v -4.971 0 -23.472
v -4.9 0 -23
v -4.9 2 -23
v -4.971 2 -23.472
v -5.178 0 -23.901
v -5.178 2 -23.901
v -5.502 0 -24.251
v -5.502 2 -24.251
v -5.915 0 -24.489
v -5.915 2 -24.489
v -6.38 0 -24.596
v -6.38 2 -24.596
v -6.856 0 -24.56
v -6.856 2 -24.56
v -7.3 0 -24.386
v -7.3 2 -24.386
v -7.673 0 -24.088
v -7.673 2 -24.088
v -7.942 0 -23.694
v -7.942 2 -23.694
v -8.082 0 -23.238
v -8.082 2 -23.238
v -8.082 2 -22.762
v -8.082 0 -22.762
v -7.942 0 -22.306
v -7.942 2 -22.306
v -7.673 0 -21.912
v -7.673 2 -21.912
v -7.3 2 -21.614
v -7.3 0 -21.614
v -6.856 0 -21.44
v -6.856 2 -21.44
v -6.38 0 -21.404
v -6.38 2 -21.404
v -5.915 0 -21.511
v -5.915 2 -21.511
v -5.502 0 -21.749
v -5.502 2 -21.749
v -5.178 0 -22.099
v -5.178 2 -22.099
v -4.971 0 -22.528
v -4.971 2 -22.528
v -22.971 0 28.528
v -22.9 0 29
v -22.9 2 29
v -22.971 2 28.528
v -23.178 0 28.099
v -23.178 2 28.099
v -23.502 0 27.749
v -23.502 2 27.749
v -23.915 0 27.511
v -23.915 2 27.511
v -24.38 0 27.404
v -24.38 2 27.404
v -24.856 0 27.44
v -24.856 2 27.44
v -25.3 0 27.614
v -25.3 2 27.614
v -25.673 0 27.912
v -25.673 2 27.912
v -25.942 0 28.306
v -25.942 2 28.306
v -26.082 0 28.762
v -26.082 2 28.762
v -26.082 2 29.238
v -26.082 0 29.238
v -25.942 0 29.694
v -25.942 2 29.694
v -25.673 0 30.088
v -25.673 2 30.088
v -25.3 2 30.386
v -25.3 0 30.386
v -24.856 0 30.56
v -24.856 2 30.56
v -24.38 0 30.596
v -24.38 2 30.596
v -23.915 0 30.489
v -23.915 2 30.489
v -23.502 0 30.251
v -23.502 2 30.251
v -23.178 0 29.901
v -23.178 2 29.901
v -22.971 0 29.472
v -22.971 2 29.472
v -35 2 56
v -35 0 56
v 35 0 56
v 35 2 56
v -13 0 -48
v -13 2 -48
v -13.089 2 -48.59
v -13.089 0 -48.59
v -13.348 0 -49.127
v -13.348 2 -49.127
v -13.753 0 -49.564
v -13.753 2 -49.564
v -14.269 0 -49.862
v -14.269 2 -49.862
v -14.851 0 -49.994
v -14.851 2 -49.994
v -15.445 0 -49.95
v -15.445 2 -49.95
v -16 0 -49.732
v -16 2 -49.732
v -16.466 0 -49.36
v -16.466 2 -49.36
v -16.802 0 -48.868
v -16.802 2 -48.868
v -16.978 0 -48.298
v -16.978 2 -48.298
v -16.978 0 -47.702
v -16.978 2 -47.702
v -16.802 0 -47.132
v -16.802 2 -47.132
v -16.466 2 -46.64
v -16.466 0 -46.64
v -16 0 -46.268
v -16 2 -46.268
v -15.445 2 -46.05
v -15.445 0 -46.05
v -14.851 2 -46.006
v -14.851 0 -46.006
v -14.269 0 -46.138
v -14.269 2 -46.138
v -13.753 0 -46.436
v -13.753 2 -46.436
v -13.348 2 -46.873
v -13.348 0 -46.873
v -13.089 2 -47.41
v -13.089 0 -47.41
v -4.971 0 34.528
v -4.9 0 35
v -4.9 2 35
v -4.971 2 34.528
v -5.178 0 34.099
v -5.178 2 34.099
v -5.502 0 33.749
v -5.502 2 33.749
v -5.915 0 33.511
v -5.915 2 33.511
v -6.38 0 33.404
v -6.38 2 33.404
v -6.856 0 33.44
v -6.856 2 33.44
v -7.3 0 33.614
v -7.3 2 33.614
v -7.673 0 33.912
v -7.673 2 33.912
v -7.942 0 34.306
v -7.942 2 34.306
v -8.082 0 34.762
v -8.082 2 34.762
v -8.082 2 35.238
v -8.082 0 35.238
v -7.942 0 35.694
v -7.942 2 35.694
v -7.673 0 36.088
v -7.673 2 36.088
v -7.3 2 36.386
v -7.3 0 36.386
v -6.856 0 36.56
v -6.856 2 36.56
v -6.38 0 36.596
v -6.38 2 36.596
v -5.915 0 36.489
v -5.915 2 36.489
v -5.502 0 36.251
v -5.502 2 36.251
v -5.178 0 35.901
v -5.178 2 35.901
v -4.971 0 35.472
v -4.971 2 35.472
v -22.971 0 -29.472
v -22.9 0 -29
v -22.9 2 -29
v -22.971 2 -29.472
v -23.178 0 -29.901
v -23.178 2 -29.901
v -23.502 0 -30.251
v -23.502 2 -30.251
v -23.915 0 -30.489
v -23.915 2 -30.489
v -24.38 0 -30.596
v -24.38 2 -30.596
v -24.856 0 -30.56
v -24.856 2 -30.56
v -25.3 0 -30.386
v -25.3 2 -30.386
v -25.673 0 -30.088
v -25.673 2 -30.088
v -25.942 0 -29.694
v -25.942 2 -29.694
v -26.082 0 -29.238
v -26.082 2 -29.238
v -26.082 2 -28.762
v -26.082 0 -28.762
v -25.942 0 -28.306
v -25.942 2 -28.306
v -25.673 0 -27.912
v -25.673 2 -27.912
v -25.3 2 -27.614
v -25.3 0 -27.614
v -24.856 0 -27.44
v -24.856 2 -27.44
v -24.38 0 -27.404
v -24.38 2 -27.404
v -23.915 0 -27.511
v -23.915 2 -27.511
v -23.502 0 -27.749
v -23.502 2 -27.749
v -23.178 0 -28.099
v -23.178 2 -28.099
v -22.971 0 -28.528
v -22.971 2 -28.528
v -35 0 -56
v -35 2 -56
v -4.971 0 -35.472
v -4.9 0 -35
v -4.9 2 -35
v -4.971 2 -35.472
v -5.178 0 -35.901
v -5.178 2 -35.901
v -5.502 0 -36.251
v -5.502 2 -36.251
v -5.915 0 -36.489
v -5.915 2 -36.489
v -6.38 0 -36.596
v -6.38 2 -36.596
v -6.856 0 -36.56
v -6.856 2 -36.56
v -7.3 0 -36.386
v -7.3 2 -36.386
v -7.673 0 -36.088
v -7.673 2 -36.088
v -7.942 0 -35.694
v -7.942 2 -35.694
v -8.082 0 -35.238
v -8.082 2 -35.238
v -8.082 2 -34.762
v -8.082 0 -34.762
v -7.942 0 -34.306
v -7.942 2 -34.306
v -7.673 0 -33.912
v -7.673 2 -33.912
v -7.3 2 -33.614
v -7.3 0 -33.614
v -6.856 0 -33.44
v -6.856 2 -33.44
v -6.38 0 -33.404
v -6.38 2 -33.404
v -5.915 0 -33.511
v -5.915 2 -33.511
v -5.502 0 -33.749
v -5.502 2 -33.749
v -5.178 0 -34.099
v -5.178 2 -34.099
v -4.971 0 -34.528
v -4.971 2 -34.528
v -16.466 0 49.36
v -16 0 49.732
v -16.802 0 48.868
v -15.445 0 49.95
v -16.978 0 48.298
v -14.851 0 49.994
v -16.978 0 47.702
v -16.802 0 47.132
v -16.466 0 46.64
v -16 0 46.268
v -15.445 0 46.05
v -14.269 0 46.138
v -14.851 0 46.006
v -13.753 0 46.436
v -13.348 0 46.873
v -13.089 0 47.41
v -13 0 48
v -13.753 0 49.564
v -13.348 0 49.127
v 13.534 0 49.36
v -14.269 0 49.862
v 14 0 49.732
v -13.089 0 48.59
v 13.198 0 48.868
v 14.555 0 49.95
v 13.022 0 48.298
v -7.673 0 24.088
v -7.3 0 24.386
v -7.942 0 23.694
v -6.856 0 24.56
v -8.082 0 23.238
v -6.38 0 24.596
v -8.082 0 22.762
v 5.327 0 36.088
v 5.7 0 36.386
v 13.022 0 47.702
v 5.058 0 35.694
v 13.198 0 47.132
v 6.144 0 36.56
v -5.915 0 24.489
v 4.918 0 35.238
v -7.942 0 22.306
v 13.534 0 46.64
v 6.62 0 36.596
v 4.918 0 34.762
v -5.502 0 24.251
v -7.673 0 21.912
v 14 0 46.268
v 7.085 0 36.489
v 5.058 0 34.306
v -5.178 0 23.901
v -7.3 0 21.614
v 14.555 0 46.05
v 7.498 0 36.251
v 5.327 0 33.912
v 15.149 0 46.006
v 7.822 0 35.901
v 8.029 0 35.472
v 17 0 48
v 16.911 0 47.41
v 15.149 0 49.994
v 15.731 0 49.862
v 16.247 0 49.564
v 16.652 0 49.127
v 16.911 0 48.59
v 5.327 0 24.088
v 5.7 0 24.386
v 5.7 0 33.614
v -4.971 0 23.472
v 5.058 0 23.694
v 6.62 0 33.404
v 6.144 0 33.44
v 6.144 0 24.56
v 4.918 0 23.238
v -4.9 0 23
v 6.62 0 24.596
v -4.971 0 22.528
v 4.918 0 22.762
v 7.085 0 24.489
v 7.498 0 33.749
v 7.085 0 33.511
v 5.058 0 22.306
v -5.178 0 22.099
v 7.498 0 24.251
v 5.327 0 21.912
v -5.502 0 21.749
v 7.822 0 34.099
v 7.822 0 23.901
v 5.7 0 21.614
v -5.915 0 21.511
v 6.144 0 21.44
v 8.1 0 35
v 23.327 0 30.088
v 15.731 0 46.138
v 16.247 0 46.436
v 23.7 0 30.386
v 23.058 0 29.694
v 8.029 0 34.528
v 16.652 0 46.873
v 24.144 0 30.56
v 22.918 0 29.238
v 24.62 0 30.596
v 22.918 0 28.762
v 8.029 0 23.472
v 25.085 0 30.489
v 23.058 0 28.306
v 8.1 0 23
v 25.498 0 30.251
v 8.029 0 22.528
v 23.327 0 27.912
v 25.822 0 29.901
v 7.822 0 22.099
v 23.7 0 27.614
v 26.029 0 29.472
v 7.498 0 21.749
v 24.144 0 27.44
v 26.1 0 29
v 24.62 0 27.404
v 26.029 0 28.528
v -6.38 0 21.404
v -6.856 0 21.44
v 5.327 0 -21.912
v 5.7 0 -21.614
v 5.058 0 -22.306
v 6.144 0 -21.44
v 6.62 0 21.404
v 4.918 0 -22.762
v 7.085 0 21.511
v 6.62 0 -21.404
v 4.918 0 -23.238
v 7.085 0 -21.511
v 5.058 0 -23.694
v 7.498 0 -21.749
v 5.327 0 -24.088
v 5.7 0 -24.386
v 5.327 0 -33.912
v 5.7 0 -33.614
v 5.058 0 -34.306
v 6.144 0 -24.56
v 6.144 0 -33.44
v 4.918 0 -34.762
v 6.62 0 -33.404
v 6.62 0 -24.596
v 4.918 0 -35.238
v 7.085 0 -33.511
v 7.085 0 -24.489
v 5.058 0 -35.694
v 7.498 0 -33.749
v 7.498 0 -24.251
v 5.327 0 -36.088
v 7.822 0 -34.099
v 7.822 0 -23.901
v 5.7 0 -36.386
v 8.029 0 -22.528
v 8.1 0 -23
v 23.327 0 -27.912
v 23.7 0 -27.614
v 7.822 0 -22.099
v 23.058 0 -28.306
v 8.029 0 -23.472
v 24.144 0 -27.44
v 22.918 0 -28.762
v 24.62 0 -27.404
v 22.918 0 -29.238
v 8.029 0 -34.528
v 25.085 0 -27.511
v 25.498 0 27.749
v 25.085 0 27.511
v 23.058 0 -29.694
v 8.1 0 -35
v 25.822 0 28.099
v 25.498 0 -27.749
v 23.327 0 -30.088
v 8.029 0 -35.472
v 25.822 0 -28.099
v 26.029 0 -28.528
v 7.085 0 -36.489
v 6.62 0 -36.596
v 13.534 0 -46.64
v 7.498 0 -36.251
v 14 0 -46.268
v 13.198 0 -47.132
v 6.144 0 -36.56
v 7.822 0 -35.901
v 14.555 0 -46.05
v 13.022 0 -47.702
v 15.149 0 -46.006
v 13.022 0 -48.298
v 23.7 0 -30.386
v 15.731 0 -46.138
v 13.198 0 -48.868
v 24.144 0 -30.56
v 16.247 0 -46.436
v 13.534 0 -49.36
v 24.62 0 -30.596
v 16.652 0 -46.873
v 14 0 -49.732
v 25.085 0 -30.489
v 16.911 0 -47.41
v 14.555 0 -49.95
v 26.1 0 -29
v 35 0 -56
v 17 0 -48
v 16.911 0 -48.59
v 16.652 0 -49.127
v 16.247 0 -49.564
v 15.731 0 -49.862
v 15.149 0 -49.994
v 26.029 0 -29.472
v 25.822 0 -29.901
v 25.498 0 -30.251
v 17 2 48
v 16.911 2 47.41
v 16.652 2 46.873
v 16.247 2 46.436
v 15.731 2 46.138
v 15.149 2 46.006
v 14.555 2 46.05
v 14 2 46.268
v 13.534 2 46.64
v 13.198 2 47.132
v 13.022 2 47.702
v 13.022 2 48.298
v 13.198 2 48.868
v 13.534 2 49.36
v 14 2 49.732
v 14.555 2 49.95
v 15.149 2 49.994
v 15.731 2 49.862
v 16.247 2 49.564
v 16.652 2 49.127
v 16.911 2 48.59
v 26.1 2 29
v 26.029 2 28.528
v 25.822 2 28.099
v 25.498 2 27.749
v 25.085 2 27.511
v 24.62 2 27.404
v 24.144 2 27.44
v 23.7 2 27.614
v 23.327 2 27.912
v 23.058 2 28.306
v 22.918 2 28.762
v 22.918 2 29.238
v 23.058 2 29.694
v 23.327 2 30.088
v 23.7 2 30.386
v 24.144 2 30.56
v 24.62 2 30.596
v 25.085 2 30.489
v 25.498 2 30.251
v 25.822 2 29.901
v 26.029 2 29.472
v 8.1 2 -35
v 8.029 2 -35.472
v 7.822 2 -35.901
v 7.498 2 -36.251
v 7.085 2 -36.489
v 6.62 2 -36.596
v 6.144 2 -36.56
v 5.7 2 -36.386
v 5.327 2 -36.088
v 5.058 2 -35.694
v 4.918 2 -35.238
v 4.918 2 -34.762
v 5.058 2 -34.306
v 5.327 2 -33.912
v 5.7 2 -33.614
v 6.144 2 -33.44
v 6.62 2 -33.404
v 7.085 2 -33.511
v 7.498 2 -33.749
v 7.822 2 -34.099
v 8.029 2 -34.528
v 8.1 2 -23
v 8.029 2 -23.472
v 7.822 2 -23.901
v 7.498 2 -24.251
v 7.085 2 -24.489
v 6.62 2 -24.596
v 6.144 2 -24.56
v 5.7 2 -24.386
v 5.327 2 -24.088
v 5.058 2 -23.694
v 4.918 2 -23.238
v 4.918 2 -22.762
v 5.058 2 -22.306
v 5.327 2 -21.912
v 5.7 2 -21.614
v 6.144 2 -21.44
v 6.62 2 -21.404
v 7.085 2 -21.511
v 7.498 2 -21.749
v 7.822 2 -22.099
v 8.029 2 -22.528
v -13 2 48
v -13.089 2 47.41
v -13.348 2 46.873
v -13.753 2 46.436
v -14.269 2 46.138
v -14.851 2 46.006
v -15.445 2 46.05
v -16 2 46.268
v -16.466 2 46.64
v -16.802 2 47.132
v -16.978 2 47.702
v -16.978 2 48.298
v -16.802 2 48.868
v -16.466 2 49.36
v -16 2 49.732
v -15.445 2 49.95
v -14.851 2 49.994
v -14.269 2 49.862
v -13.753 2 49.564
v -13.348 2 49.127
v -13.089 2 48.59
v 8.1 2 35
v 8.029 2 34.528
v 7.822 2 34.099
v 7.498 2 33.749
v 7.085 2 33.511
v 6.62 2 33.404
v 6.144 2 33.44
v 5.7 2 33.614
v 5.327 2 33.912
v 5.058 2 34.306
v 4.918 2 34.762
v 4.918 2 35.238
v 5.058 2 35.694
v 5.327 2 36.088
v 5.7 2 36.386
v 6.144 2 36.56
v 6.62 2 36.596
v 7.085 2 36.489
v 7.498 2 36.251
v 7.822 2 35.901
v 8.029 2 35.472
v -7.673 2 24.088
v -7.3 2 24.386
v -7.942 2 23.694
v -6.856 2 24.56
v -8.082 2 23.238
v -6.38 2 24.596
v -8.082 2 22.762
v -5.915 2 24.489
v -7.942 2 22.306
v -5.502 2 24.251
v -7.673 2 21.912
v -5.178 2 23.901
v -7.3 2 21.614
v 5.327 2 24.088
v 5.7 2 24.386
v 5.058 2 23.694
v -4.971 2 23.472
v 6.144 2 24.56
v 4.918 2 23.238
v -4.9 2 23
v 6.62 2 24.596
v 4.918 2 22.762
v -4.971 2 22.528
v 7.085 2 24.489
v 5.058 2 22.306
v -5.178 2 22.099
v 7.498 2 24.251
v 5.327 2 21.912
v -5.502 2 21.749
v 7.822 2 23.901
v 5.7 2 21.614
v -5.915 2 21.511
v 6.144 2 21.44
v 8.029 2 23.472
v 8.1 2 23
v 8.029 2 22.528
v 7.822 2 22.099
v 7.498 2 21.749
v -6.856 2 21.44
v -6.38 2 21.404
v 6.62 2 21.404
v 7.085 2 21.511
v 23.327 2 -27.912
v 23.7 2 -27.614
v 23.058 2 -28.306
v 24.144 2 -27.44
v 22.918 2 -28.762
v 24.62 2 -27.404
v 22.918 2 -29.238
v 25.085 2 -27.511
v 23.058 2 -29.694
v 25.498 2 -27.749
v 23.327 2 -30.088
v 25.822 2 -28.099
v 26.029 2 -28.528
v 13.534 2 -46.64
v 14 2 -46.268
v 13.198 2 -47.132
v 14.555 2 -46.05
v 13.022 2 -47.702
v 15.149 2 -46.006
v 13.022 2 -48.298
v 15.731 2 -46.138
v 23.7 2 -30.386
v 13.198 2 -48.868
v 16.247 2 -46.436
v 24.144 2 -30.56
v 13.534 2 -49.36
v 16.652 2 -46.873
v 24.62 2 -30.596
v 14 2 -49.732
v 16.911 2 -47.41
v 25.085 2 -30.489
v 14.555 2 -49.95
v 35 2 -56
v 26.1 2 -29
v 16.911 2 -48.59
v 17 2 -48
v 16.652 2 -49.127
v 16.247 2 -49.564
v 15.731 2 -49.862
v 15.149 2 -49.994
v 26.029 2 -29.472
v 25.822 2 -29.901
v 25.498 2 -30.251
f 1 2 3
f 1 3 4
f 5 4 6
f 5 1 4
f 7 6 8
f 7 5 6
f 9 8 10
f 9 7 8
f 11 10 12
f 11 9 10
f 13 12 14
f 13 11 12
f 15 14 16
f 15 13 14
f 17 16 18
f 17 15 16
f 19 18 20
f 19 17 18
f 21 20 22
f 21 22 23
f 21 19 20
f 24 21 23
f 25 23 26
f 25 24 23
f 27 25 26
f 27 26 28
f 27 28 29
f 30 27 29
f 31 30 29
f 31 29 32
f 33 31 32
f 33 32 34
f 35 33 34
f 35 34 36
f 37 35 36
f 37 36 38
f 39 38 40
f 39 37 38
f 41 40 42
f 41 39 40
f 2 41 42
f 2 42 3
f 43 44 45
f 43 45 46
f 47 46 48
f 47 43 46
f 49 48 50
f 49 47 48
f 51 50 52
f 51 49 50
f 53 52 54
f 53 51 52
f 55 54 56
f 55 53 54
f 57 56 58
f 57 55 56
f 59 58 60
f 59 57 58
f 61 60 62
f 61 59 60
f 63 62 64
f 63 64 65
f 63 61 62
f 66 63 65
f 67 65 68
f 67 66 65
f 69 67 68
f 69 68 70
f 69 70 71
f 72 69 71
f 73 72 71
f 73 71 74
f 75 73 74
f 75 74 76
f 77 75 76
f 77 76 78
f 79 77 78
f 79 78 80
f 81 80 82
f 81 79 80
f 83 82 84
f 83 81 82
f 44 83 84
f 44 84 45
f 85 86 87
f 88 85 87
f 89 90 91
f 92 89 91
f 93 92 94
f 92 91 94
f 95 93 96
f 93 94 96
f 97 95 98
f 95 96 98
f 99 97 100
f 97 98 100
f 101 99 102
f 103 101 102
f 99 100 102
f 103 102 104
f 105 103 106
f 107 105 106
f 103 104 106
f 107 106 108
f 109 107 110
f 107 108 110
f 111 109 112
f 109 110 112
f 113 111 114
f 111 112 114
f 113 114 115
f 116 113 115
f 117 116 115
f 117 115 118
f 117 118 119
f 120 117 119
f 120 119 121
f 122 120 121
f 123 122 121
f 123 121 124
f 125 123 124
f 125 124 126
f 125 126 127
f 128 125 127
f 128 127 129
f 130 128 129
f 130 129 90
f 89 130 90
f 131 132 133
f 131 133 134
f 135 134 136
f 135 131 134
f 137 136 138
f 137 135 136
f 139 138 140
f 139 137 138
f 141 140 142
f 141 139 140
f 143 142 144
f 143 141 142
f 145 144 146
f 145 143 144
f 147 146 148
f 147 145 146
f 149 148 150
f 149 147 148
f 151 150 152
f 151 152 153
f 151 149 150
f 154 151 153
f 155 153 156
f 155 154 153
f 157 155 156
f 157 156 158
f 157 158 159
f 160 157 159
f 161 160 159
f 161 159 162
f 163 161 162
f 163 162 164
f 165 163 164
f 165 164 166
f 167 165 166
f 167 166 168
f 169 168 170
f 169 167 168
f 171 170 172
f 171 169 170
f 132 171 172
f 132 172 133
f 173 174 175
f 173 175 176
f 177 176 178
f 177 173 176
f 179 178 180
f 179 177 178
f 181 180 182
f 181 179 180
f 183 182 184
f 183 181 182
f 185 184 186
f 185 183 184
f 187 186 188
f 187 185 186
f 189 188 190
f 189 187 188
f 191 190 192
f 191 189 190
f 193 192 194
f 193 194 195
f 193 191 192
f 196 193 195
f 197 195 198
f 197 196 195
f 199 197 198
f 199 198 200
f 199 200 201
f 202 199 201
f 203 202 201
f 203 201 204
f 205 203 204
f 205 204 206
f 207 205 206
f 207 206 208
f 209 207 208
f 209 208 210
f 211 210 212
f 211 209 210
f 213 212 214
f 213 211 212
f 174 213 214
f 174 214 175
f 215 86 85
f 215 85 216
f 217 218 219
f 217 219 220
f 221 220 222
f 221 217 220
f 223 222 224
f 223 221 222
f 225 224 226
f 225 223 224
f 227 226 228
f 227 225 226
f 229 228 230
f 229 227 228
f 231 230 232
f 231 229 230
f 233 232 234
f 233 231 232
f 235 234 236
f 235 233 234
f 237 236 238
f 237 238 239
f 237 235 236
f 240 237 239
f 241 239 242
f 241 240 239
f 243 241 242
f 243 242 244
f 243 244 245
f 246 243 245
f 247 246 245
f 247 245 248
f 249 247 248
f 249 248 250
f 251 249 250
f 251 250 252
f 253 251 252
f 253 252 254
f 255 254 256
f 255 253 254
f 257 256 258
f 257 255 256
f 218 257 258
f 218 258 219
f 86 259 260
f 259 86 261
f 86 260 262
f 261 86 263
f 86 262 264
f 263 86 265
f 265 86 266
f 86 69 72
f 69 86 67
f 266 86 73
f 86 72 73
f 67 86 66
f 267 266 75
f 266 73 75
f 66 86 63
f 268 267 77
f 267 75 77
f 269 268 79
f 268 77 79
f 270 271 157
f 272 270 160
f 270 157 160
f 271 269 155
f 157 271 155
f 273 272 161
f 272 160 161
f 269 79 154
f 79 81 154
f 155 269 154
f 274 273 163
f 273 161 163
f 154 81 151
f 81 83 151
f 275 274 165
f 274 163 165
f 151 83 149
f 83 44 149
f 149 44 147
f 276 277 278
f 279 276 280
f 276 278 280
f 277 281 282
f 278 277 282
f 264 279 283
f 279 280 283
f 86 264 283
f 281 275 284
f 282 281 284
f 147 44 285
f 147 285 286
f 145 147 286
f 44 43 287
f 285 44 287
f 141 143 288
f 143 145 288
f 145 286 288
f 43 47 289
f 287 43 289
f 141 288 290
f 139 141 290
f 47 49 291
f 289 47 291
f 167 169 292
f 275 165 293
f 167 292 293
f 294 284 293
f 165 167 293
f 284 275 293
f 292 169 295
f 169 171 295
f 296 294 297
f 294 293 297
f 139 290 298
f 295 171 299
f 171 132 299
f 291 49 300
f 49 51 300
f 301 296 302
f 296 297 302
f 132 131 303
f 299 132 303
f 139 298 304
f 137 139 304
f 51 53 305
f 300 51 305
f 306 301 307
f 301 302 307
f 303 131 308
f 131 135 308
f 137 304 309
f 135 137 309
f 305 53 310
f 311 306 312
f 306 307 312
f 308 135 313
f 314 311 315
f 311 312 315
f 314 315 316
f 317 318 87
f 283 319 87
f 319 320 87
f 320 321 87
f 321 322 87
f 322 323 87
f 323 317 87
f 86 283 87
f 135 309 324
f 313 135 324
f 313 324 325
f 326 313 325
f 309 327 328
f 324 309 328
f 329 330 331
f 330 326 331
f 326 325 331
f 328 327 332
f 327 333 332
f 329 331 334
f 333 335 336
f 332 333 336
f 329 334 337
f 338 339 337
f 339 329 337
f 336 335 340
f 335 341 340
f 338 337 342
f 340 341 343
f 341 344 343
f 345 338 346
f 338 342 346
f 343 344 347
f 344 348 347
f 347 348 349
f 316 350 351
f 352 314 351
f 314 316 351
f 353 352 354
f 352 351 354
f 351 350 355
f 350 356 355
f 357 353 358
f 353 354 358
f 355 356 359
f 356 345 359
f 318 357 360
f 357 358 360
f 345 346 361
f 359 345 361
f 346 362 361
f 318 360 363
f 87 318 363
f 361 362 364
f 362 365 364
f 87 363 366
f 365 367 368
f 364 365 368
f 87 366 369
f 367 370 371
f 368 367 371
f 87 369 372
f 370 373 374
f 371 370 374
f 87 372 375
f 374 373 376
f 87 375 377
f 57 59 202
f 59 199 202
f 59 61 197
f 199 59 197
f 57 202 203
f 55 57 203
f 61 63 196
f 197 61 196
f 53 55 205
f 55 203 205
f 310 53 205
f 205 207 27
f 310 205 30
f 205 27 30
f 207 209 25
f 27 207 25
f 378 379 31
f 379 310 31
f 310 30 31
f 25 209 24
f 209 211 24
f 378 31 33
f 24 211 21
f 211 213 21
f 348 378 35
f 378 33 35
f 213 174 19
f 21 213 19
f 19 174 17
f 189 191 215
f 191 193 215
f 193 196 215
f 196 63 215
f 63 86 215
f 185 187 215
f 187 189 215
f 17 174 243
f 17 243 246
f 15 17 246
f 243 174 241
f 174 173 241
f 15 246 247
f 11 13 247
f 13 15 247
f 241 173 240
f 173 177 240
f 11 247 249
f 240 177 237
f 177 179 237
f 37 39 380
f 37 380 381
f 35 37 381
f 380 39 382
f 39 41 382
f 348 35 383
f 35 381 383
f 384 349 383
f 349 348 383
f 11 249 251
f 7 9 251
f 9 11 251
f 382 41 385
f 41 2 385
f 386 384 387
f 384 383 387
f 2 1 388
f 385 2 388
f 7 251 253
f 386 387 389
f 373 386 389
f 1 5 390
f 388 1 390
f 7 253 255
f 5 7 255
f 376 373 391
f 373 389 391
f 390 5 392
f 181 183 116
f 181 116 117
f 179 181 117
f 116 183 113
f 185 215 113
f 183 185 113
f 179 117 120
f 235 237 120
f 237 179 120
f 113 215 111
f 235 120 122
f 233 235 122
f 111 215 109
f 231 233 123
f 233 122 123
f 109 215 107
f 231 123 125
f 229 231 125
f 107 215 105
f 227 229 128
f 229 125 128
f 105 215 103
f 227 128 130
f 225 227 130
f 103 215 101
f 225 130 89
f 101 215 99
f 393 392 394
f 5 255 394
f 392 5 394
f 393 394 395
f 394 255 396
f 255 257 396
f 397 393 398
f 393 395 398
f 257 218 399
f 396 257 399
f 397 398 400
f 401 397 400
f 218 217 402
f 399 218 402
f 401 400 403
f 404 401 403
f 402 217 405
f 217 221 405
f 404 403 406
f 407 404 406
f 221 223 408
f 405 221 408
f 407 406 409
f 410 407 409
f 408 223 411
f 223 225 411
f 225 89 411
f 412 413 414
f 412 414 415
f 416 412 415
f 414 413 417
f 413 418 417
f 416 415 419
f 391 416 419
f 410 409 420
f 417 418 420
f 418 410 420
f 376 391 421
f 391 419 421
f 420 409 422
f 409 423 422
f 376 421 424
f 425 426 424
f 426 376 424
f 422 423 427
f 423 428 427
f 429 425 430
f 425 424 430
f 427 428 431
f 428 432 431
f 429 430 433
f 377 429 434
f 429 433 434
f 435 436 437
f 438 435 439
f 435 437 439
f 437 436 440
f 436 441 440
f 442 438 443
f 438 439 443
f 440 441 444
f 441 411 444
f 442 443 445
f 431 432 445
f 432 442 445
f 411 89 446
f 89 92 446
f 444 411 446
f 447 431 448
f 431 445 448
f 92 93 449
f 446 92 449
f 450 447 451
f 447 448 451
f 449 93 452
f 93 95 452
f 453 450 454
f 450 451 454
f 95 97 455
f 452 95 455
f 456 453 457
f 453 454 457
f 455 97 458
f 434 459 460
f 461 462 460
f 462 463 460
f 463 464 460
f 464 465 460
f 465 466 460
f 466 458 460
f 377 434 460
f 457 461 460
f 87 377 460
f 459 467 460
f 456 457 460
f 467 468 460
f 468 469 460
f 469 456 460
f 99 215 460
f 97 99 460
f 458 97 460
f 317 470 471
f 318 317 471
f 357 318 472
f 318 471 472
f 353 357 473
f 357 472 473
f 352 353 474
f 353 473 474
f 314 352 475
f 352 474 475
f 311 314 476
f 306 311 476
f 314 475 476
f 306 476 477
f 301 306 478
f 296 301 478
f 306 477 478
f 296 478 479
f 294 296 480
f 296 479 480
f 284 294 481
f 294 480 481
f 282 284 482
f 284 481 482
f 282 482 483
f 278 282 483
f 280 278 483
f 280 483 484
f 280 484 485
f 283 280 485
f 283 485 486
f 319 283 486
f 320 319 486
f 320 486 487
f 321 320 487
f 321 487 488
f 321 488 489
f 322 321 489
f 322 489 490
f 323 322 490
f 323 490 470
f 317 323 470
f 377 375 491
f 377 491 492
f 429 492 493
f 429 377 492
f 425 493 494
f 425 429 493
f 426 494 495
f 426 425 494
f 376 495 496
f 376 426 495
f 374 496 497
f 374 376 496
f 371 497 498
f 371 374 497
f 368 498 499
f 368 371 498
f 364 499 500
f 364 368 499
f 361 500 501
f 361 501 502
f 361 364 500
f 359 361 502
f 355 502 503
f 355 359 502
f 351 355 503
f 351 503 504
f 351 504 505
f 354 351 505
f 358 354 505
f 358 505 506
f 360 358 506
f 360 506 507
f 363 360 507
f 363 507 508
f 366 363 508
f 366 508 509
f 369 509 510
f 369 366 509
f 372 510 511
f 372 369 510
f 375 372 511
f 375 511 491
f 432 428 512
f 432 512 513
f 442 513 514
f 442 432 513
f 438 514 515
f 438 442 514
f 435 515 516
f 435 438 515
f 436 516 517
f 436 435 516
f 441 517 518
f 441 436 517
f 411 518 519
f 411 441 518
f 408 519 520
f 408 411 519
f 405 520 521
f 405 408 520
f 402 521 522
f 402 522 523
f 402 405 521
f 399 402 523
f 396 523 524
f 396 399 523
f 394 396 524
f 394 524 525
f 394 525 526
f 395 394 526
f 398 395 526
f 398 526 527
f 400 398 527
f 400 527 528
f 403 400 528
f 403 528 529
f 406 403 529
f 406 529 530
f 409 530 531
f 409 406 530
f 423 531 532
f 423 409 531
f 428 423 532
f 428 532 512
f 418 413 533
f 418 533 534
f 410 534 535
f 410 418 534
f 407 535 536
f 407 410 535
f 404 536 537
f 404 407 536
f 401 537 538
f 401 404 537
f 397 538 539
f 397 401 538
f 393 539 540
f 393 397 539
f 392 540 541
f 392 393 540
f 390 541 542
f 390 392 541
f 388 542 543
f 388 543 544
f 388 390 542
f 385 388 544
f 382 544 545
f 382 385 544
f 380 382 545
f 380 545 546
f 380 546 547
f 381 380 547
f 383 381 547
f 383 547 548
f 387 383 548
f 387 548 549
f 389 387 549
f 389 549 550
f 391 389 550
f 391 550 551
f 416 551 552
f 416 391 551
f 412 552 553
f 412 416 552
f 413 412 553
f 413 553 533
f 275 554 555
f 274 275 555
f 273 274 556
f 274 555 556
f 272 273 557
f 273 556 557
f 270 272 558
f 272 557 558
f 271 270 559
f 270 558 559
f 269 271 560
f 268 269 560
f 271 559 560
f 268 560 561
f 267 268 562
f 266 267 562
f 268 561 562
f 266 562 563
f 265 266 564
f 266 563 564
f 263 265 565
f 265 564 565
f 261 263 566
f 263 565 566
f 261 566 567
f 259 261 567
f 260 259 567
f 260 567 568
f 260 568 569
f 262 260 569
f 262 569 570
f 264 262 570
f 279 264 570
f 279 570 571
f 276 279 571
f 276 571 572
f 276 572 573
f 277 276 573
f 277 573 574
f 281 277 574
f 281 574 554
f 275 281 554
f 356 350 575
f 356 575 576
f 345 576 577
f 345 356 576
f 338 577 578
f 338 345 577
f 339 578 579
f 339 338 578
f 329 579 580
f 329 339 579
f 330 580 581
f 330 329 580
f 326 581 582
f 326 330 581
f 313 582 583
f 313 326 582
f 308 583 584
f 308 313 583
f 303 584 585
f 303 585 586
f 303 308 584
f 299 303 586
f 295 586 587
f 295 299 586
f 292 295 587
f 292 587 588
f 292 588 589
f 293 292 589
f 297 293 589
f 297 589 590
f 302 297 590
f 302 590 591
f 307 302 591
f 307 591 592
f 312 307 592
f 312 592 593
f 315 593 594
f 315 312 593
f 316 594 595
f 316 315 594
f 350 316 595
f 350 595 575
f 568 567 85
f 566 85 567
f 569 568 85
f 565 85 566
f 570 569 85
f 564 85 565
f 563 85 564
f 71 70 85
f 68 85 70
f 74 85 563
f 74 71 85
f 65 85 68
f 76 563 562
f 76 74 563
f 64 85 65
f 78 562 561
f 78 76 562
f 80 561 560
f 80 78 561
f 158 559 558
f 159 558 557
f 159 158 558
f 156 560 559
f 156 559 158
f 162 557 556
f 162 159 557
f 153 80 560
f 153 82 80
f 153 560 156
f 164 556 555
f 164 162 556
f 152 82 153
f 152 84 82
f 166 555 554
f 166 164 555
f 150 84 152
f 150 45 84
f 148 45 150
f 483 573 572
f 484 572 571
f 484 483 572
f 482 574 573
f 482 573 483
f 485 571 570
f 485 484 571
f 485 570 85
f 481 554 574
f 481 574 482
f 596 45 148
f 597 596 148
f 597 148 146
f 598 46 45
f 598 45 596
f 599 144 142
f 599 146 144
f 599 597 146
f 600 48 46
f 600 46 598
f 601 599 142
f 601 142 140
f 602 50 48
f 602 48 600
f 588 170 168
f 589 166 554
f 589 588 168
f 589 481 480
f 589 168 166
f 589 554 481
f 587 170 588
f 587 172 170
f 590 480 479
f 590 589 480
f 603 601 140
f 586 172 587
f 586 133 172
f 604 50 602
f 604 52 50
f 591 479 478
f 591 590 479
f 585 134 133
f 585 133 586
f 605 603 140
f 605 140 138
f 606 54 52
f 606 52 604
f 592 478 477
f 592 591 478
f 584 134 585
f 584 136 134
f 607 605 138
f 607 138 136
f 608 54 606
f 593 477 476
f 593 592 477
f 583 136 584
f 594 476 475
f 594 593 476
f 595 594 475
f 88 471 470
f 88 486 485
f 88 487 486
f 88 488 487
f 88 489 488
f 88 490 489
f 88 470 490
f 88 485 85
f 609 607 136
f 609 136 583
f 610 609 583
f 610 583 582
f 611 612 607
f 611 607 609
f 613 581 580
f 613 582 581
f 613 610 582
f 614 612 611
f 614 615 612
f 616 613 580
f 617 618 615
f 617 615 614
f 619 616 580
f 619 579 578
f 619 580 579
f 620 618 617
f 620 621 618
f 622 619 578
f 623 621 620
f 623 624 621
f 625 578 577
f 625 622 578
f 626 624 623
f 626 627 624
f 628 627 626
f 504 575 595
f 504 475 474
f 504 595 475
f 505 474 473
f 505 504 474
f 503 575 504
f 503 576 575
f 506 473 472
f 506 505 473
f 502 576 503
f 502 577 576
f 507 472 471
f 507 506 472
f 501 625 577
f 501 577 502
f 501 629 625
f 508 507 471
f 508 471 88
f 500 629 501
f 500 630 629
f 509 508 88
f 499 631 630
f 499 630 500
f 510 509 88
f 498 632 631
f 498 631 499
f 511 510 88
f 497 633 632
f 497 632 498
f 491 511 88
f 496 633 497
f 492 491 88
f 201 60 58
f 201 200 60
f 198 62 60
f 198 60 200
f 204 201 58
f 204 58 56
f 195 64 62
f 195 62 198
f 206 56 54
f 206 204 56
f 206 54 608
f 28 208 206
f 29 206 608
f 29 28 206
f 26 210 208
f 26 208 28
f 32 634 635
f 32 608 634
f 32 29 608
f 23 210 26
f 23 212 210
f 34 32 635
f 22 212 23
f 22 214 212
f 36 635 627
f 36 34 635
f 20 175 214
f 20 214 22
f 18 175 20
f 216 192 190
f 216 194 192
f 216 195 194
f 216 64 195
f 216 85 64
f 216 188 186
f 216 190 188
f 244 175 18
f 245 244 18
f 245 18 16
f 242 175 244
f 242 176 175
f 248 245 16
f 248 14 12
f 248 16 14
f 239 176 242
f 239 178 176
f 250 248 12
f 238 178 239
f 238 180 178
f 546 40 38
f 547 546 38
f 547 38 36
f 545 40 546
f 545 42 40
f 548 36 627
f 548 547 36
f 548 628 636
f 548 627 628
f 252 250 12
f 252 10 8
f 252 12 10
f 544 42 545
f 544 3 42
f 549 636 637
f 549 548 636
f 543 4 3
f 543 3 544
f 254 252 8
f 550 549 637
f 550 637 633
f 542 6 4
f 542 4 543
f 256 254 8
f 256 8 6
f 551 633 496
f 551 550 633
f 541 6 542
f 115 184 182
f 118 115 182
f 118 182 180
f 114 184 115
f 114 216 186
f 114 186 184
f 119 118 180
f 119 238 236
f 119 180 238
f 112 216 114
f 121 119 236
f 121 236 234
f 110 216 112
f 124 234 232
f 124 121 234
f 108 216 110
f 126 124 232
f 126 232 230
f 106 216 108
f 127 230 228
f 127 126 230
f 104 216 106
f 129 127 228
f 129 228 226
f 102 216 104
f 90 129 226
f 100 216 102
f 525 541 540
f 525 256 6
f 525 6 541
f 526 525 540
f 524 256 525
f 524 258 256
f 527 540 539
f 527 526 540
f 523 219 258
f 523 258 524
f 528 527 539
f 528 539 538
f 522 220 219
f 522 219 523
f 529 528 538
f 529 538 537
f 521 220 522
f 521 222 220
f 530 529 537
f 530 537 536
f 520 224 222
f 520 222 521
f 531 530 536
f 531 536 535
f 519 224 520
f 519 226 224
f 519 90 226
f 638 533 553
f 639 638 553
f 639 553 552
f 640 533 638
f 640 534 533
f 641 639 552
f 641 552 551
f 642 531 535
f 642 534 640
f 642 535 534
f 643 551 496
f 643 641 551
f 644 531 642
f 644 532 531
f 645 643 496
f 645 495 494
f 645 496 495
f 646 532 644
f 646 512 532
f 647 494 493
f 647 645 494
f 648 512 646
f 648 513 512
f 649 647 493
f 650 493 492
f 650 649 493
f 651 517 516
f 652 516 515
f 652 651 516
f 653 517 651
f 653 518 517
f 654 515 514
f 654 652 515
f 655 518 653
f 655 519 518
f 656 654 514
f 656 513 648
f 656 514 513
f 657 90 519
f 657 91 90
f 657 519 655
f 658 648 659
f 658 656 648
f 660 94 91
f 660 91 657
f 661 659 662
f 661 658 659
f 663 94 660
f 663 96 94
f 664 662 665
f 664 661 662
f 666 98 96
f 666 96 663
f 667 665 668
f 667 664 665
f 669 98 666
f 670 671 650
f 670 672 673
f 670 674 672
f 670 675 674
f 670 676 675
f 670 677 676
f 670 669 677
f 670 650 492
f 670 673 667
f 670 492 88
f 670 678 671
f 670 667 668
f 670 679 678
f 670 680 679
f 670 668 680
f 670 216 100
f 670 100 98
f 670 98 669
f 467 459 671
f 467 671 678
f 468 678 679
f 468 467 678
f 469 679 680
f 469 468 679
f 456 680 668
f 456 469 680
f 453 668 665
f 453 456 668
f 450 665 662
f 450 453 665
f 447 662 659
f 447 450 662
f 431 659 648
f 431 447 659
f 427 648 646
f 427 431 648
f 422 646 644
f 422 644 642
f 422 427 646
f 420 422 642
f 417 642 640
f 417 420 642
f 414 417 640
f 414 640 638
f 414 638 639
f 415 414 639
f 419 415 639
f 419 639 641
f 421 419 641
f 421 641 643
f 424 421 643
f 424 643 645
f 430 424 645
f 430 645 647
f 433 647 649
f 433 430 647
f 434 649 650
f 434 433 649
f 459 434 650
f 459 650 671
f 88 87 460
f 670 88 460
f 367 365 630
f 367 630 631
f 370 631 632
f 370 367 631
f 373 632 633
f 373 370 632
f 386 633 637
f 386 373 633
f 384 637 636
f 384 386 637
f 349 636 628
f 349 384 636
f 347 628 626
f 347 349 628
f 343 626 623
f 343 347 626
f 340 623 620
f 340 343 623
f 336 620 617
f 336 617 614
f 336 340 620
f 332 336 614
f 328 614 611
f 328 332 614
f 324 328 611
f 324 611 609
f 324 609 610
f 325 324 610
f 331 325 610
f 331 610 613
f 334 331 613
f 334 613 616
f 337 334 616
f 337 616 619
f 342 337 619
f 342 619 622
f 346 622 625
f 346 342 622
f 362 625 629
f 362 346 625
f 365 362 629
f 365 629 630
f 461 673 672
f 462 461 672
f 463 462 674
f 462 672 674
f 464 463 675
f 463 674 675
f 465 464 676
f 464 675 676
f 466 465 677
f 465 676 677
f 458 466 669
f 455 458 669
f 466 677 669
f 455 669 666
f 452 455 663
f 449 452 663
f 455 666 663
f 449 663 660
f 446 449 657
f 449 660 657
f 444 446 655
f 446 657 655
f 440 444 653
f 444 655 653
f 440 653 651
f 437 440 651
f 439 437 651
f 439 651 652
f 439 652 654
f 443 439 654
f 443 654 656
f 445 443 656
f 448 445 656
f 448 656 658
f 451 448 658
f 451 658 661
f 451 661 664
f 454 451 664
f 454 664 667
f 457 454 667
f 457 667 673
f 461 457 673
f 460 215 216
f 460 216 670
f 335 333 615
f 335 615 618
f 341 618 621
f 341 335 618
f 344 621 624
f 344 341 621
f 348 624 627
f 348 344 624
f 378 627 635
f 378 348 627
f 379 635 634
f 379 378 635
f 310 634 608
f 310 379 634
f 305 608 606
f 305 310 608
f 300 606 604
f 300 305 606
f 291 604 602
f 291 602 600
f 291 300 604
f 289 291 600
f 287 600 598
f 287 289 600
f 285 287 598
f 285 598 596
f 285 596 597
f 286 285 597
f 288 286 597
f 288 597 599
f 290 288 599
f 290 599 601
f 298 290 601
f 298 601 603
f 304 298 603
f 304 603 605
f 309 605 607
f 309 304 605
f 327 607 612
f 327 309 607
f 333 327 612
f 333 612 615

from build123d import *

# Parameters (mm, degrees)
SKETCH_2_W          = 70
SKETCH_2_H          = 112
SKETCH_2_R          = 1.6
EXTRUDE_1_DEPTH     = 2
SKETCH_3_R          = 2
CUT_EXTRUDE_1_DEPTH = 3


with BuildPart() as part:
    # 草圖2 → 填料-伸長1 (new body)
    with BuildSketch(Plane(origin=(0, 0, 0), x_dir=(1, 0, 0), z_dir=(0, 1, 0))):
        Rectangle(SKETCH_2_W, SKETCH_2_H)
        with Locations((-6.5, 35)):
            Circle(SKETCH_2_R, mode=Mode.SUBTRACT)
        with Locations((-6.5, -35)):
            Circle(SKETCH_2_R, mode=Mode.SUBTRACT)
        with Locations((-6.5, 23)):
            Circle(SKETCH_2_R, mode=Mode.SUBTRACT)
        with Locations((-6.5, -23)):
            Circle(SKETCH_2_R, mode=Mode.SUBTRACT)
        with Locations((6.5, -35)):
            Circle(SKETCH_2_R, mode=Mode.SUBTRACT)
        with Locations((6.5, -23)):
            Circle(SKETCH_2_R, mode=Mode.SUBTRACT)
        with Locations((6.5, 23)):
            Circle(SKETCH_2_R, mode=Mode.SUBTRACT)
        with Locations((6.5, 35)):
            Circle(SKETCH_2_R, mode=Mode.SUBTRACT)
        with Locations((-24.5, 29)):
            Circle(SKETCH_2_R, mode=Mode.SUBTRACT)
        with Locations((24.5, 29)):
            Circle(SKETCH_2_R, mode=Mode.SUBTRACT)
        with Locations((-24.5, -29)):
            Circle(SKETCH_2_R, mode=Mode.SUBTRACT)
        with Locations((24.5, -29)):
            Circle(SKETCH_2_R, mode=Mode.SUBTRACT)
    extrude(amount=EXTRUDE_1_DEPTH)

    # 草圖3 → 除料-伸長1 (cut, through all)
    with BuildSketch(Plane(origin=(0, 2, 0), x_dir=(1, 0, 0), z_dir=(0, 1, 0))):
        with Locations((-15, -48)):
            Circle(SKETCH_3_R)
        with Locations((-15, 48)):
            Circle(SKETCH_3_R)
        with Locations((15, -48)):
            Circle(SKETCH_3_R)
        with Locations((15, 48)):
            Circle(SKETCH_3_R)
    extrude(amount=-CUT_EXTRUDE_1_DEPTH, mode=Mode.SUBTRACT)


solid = part.part
